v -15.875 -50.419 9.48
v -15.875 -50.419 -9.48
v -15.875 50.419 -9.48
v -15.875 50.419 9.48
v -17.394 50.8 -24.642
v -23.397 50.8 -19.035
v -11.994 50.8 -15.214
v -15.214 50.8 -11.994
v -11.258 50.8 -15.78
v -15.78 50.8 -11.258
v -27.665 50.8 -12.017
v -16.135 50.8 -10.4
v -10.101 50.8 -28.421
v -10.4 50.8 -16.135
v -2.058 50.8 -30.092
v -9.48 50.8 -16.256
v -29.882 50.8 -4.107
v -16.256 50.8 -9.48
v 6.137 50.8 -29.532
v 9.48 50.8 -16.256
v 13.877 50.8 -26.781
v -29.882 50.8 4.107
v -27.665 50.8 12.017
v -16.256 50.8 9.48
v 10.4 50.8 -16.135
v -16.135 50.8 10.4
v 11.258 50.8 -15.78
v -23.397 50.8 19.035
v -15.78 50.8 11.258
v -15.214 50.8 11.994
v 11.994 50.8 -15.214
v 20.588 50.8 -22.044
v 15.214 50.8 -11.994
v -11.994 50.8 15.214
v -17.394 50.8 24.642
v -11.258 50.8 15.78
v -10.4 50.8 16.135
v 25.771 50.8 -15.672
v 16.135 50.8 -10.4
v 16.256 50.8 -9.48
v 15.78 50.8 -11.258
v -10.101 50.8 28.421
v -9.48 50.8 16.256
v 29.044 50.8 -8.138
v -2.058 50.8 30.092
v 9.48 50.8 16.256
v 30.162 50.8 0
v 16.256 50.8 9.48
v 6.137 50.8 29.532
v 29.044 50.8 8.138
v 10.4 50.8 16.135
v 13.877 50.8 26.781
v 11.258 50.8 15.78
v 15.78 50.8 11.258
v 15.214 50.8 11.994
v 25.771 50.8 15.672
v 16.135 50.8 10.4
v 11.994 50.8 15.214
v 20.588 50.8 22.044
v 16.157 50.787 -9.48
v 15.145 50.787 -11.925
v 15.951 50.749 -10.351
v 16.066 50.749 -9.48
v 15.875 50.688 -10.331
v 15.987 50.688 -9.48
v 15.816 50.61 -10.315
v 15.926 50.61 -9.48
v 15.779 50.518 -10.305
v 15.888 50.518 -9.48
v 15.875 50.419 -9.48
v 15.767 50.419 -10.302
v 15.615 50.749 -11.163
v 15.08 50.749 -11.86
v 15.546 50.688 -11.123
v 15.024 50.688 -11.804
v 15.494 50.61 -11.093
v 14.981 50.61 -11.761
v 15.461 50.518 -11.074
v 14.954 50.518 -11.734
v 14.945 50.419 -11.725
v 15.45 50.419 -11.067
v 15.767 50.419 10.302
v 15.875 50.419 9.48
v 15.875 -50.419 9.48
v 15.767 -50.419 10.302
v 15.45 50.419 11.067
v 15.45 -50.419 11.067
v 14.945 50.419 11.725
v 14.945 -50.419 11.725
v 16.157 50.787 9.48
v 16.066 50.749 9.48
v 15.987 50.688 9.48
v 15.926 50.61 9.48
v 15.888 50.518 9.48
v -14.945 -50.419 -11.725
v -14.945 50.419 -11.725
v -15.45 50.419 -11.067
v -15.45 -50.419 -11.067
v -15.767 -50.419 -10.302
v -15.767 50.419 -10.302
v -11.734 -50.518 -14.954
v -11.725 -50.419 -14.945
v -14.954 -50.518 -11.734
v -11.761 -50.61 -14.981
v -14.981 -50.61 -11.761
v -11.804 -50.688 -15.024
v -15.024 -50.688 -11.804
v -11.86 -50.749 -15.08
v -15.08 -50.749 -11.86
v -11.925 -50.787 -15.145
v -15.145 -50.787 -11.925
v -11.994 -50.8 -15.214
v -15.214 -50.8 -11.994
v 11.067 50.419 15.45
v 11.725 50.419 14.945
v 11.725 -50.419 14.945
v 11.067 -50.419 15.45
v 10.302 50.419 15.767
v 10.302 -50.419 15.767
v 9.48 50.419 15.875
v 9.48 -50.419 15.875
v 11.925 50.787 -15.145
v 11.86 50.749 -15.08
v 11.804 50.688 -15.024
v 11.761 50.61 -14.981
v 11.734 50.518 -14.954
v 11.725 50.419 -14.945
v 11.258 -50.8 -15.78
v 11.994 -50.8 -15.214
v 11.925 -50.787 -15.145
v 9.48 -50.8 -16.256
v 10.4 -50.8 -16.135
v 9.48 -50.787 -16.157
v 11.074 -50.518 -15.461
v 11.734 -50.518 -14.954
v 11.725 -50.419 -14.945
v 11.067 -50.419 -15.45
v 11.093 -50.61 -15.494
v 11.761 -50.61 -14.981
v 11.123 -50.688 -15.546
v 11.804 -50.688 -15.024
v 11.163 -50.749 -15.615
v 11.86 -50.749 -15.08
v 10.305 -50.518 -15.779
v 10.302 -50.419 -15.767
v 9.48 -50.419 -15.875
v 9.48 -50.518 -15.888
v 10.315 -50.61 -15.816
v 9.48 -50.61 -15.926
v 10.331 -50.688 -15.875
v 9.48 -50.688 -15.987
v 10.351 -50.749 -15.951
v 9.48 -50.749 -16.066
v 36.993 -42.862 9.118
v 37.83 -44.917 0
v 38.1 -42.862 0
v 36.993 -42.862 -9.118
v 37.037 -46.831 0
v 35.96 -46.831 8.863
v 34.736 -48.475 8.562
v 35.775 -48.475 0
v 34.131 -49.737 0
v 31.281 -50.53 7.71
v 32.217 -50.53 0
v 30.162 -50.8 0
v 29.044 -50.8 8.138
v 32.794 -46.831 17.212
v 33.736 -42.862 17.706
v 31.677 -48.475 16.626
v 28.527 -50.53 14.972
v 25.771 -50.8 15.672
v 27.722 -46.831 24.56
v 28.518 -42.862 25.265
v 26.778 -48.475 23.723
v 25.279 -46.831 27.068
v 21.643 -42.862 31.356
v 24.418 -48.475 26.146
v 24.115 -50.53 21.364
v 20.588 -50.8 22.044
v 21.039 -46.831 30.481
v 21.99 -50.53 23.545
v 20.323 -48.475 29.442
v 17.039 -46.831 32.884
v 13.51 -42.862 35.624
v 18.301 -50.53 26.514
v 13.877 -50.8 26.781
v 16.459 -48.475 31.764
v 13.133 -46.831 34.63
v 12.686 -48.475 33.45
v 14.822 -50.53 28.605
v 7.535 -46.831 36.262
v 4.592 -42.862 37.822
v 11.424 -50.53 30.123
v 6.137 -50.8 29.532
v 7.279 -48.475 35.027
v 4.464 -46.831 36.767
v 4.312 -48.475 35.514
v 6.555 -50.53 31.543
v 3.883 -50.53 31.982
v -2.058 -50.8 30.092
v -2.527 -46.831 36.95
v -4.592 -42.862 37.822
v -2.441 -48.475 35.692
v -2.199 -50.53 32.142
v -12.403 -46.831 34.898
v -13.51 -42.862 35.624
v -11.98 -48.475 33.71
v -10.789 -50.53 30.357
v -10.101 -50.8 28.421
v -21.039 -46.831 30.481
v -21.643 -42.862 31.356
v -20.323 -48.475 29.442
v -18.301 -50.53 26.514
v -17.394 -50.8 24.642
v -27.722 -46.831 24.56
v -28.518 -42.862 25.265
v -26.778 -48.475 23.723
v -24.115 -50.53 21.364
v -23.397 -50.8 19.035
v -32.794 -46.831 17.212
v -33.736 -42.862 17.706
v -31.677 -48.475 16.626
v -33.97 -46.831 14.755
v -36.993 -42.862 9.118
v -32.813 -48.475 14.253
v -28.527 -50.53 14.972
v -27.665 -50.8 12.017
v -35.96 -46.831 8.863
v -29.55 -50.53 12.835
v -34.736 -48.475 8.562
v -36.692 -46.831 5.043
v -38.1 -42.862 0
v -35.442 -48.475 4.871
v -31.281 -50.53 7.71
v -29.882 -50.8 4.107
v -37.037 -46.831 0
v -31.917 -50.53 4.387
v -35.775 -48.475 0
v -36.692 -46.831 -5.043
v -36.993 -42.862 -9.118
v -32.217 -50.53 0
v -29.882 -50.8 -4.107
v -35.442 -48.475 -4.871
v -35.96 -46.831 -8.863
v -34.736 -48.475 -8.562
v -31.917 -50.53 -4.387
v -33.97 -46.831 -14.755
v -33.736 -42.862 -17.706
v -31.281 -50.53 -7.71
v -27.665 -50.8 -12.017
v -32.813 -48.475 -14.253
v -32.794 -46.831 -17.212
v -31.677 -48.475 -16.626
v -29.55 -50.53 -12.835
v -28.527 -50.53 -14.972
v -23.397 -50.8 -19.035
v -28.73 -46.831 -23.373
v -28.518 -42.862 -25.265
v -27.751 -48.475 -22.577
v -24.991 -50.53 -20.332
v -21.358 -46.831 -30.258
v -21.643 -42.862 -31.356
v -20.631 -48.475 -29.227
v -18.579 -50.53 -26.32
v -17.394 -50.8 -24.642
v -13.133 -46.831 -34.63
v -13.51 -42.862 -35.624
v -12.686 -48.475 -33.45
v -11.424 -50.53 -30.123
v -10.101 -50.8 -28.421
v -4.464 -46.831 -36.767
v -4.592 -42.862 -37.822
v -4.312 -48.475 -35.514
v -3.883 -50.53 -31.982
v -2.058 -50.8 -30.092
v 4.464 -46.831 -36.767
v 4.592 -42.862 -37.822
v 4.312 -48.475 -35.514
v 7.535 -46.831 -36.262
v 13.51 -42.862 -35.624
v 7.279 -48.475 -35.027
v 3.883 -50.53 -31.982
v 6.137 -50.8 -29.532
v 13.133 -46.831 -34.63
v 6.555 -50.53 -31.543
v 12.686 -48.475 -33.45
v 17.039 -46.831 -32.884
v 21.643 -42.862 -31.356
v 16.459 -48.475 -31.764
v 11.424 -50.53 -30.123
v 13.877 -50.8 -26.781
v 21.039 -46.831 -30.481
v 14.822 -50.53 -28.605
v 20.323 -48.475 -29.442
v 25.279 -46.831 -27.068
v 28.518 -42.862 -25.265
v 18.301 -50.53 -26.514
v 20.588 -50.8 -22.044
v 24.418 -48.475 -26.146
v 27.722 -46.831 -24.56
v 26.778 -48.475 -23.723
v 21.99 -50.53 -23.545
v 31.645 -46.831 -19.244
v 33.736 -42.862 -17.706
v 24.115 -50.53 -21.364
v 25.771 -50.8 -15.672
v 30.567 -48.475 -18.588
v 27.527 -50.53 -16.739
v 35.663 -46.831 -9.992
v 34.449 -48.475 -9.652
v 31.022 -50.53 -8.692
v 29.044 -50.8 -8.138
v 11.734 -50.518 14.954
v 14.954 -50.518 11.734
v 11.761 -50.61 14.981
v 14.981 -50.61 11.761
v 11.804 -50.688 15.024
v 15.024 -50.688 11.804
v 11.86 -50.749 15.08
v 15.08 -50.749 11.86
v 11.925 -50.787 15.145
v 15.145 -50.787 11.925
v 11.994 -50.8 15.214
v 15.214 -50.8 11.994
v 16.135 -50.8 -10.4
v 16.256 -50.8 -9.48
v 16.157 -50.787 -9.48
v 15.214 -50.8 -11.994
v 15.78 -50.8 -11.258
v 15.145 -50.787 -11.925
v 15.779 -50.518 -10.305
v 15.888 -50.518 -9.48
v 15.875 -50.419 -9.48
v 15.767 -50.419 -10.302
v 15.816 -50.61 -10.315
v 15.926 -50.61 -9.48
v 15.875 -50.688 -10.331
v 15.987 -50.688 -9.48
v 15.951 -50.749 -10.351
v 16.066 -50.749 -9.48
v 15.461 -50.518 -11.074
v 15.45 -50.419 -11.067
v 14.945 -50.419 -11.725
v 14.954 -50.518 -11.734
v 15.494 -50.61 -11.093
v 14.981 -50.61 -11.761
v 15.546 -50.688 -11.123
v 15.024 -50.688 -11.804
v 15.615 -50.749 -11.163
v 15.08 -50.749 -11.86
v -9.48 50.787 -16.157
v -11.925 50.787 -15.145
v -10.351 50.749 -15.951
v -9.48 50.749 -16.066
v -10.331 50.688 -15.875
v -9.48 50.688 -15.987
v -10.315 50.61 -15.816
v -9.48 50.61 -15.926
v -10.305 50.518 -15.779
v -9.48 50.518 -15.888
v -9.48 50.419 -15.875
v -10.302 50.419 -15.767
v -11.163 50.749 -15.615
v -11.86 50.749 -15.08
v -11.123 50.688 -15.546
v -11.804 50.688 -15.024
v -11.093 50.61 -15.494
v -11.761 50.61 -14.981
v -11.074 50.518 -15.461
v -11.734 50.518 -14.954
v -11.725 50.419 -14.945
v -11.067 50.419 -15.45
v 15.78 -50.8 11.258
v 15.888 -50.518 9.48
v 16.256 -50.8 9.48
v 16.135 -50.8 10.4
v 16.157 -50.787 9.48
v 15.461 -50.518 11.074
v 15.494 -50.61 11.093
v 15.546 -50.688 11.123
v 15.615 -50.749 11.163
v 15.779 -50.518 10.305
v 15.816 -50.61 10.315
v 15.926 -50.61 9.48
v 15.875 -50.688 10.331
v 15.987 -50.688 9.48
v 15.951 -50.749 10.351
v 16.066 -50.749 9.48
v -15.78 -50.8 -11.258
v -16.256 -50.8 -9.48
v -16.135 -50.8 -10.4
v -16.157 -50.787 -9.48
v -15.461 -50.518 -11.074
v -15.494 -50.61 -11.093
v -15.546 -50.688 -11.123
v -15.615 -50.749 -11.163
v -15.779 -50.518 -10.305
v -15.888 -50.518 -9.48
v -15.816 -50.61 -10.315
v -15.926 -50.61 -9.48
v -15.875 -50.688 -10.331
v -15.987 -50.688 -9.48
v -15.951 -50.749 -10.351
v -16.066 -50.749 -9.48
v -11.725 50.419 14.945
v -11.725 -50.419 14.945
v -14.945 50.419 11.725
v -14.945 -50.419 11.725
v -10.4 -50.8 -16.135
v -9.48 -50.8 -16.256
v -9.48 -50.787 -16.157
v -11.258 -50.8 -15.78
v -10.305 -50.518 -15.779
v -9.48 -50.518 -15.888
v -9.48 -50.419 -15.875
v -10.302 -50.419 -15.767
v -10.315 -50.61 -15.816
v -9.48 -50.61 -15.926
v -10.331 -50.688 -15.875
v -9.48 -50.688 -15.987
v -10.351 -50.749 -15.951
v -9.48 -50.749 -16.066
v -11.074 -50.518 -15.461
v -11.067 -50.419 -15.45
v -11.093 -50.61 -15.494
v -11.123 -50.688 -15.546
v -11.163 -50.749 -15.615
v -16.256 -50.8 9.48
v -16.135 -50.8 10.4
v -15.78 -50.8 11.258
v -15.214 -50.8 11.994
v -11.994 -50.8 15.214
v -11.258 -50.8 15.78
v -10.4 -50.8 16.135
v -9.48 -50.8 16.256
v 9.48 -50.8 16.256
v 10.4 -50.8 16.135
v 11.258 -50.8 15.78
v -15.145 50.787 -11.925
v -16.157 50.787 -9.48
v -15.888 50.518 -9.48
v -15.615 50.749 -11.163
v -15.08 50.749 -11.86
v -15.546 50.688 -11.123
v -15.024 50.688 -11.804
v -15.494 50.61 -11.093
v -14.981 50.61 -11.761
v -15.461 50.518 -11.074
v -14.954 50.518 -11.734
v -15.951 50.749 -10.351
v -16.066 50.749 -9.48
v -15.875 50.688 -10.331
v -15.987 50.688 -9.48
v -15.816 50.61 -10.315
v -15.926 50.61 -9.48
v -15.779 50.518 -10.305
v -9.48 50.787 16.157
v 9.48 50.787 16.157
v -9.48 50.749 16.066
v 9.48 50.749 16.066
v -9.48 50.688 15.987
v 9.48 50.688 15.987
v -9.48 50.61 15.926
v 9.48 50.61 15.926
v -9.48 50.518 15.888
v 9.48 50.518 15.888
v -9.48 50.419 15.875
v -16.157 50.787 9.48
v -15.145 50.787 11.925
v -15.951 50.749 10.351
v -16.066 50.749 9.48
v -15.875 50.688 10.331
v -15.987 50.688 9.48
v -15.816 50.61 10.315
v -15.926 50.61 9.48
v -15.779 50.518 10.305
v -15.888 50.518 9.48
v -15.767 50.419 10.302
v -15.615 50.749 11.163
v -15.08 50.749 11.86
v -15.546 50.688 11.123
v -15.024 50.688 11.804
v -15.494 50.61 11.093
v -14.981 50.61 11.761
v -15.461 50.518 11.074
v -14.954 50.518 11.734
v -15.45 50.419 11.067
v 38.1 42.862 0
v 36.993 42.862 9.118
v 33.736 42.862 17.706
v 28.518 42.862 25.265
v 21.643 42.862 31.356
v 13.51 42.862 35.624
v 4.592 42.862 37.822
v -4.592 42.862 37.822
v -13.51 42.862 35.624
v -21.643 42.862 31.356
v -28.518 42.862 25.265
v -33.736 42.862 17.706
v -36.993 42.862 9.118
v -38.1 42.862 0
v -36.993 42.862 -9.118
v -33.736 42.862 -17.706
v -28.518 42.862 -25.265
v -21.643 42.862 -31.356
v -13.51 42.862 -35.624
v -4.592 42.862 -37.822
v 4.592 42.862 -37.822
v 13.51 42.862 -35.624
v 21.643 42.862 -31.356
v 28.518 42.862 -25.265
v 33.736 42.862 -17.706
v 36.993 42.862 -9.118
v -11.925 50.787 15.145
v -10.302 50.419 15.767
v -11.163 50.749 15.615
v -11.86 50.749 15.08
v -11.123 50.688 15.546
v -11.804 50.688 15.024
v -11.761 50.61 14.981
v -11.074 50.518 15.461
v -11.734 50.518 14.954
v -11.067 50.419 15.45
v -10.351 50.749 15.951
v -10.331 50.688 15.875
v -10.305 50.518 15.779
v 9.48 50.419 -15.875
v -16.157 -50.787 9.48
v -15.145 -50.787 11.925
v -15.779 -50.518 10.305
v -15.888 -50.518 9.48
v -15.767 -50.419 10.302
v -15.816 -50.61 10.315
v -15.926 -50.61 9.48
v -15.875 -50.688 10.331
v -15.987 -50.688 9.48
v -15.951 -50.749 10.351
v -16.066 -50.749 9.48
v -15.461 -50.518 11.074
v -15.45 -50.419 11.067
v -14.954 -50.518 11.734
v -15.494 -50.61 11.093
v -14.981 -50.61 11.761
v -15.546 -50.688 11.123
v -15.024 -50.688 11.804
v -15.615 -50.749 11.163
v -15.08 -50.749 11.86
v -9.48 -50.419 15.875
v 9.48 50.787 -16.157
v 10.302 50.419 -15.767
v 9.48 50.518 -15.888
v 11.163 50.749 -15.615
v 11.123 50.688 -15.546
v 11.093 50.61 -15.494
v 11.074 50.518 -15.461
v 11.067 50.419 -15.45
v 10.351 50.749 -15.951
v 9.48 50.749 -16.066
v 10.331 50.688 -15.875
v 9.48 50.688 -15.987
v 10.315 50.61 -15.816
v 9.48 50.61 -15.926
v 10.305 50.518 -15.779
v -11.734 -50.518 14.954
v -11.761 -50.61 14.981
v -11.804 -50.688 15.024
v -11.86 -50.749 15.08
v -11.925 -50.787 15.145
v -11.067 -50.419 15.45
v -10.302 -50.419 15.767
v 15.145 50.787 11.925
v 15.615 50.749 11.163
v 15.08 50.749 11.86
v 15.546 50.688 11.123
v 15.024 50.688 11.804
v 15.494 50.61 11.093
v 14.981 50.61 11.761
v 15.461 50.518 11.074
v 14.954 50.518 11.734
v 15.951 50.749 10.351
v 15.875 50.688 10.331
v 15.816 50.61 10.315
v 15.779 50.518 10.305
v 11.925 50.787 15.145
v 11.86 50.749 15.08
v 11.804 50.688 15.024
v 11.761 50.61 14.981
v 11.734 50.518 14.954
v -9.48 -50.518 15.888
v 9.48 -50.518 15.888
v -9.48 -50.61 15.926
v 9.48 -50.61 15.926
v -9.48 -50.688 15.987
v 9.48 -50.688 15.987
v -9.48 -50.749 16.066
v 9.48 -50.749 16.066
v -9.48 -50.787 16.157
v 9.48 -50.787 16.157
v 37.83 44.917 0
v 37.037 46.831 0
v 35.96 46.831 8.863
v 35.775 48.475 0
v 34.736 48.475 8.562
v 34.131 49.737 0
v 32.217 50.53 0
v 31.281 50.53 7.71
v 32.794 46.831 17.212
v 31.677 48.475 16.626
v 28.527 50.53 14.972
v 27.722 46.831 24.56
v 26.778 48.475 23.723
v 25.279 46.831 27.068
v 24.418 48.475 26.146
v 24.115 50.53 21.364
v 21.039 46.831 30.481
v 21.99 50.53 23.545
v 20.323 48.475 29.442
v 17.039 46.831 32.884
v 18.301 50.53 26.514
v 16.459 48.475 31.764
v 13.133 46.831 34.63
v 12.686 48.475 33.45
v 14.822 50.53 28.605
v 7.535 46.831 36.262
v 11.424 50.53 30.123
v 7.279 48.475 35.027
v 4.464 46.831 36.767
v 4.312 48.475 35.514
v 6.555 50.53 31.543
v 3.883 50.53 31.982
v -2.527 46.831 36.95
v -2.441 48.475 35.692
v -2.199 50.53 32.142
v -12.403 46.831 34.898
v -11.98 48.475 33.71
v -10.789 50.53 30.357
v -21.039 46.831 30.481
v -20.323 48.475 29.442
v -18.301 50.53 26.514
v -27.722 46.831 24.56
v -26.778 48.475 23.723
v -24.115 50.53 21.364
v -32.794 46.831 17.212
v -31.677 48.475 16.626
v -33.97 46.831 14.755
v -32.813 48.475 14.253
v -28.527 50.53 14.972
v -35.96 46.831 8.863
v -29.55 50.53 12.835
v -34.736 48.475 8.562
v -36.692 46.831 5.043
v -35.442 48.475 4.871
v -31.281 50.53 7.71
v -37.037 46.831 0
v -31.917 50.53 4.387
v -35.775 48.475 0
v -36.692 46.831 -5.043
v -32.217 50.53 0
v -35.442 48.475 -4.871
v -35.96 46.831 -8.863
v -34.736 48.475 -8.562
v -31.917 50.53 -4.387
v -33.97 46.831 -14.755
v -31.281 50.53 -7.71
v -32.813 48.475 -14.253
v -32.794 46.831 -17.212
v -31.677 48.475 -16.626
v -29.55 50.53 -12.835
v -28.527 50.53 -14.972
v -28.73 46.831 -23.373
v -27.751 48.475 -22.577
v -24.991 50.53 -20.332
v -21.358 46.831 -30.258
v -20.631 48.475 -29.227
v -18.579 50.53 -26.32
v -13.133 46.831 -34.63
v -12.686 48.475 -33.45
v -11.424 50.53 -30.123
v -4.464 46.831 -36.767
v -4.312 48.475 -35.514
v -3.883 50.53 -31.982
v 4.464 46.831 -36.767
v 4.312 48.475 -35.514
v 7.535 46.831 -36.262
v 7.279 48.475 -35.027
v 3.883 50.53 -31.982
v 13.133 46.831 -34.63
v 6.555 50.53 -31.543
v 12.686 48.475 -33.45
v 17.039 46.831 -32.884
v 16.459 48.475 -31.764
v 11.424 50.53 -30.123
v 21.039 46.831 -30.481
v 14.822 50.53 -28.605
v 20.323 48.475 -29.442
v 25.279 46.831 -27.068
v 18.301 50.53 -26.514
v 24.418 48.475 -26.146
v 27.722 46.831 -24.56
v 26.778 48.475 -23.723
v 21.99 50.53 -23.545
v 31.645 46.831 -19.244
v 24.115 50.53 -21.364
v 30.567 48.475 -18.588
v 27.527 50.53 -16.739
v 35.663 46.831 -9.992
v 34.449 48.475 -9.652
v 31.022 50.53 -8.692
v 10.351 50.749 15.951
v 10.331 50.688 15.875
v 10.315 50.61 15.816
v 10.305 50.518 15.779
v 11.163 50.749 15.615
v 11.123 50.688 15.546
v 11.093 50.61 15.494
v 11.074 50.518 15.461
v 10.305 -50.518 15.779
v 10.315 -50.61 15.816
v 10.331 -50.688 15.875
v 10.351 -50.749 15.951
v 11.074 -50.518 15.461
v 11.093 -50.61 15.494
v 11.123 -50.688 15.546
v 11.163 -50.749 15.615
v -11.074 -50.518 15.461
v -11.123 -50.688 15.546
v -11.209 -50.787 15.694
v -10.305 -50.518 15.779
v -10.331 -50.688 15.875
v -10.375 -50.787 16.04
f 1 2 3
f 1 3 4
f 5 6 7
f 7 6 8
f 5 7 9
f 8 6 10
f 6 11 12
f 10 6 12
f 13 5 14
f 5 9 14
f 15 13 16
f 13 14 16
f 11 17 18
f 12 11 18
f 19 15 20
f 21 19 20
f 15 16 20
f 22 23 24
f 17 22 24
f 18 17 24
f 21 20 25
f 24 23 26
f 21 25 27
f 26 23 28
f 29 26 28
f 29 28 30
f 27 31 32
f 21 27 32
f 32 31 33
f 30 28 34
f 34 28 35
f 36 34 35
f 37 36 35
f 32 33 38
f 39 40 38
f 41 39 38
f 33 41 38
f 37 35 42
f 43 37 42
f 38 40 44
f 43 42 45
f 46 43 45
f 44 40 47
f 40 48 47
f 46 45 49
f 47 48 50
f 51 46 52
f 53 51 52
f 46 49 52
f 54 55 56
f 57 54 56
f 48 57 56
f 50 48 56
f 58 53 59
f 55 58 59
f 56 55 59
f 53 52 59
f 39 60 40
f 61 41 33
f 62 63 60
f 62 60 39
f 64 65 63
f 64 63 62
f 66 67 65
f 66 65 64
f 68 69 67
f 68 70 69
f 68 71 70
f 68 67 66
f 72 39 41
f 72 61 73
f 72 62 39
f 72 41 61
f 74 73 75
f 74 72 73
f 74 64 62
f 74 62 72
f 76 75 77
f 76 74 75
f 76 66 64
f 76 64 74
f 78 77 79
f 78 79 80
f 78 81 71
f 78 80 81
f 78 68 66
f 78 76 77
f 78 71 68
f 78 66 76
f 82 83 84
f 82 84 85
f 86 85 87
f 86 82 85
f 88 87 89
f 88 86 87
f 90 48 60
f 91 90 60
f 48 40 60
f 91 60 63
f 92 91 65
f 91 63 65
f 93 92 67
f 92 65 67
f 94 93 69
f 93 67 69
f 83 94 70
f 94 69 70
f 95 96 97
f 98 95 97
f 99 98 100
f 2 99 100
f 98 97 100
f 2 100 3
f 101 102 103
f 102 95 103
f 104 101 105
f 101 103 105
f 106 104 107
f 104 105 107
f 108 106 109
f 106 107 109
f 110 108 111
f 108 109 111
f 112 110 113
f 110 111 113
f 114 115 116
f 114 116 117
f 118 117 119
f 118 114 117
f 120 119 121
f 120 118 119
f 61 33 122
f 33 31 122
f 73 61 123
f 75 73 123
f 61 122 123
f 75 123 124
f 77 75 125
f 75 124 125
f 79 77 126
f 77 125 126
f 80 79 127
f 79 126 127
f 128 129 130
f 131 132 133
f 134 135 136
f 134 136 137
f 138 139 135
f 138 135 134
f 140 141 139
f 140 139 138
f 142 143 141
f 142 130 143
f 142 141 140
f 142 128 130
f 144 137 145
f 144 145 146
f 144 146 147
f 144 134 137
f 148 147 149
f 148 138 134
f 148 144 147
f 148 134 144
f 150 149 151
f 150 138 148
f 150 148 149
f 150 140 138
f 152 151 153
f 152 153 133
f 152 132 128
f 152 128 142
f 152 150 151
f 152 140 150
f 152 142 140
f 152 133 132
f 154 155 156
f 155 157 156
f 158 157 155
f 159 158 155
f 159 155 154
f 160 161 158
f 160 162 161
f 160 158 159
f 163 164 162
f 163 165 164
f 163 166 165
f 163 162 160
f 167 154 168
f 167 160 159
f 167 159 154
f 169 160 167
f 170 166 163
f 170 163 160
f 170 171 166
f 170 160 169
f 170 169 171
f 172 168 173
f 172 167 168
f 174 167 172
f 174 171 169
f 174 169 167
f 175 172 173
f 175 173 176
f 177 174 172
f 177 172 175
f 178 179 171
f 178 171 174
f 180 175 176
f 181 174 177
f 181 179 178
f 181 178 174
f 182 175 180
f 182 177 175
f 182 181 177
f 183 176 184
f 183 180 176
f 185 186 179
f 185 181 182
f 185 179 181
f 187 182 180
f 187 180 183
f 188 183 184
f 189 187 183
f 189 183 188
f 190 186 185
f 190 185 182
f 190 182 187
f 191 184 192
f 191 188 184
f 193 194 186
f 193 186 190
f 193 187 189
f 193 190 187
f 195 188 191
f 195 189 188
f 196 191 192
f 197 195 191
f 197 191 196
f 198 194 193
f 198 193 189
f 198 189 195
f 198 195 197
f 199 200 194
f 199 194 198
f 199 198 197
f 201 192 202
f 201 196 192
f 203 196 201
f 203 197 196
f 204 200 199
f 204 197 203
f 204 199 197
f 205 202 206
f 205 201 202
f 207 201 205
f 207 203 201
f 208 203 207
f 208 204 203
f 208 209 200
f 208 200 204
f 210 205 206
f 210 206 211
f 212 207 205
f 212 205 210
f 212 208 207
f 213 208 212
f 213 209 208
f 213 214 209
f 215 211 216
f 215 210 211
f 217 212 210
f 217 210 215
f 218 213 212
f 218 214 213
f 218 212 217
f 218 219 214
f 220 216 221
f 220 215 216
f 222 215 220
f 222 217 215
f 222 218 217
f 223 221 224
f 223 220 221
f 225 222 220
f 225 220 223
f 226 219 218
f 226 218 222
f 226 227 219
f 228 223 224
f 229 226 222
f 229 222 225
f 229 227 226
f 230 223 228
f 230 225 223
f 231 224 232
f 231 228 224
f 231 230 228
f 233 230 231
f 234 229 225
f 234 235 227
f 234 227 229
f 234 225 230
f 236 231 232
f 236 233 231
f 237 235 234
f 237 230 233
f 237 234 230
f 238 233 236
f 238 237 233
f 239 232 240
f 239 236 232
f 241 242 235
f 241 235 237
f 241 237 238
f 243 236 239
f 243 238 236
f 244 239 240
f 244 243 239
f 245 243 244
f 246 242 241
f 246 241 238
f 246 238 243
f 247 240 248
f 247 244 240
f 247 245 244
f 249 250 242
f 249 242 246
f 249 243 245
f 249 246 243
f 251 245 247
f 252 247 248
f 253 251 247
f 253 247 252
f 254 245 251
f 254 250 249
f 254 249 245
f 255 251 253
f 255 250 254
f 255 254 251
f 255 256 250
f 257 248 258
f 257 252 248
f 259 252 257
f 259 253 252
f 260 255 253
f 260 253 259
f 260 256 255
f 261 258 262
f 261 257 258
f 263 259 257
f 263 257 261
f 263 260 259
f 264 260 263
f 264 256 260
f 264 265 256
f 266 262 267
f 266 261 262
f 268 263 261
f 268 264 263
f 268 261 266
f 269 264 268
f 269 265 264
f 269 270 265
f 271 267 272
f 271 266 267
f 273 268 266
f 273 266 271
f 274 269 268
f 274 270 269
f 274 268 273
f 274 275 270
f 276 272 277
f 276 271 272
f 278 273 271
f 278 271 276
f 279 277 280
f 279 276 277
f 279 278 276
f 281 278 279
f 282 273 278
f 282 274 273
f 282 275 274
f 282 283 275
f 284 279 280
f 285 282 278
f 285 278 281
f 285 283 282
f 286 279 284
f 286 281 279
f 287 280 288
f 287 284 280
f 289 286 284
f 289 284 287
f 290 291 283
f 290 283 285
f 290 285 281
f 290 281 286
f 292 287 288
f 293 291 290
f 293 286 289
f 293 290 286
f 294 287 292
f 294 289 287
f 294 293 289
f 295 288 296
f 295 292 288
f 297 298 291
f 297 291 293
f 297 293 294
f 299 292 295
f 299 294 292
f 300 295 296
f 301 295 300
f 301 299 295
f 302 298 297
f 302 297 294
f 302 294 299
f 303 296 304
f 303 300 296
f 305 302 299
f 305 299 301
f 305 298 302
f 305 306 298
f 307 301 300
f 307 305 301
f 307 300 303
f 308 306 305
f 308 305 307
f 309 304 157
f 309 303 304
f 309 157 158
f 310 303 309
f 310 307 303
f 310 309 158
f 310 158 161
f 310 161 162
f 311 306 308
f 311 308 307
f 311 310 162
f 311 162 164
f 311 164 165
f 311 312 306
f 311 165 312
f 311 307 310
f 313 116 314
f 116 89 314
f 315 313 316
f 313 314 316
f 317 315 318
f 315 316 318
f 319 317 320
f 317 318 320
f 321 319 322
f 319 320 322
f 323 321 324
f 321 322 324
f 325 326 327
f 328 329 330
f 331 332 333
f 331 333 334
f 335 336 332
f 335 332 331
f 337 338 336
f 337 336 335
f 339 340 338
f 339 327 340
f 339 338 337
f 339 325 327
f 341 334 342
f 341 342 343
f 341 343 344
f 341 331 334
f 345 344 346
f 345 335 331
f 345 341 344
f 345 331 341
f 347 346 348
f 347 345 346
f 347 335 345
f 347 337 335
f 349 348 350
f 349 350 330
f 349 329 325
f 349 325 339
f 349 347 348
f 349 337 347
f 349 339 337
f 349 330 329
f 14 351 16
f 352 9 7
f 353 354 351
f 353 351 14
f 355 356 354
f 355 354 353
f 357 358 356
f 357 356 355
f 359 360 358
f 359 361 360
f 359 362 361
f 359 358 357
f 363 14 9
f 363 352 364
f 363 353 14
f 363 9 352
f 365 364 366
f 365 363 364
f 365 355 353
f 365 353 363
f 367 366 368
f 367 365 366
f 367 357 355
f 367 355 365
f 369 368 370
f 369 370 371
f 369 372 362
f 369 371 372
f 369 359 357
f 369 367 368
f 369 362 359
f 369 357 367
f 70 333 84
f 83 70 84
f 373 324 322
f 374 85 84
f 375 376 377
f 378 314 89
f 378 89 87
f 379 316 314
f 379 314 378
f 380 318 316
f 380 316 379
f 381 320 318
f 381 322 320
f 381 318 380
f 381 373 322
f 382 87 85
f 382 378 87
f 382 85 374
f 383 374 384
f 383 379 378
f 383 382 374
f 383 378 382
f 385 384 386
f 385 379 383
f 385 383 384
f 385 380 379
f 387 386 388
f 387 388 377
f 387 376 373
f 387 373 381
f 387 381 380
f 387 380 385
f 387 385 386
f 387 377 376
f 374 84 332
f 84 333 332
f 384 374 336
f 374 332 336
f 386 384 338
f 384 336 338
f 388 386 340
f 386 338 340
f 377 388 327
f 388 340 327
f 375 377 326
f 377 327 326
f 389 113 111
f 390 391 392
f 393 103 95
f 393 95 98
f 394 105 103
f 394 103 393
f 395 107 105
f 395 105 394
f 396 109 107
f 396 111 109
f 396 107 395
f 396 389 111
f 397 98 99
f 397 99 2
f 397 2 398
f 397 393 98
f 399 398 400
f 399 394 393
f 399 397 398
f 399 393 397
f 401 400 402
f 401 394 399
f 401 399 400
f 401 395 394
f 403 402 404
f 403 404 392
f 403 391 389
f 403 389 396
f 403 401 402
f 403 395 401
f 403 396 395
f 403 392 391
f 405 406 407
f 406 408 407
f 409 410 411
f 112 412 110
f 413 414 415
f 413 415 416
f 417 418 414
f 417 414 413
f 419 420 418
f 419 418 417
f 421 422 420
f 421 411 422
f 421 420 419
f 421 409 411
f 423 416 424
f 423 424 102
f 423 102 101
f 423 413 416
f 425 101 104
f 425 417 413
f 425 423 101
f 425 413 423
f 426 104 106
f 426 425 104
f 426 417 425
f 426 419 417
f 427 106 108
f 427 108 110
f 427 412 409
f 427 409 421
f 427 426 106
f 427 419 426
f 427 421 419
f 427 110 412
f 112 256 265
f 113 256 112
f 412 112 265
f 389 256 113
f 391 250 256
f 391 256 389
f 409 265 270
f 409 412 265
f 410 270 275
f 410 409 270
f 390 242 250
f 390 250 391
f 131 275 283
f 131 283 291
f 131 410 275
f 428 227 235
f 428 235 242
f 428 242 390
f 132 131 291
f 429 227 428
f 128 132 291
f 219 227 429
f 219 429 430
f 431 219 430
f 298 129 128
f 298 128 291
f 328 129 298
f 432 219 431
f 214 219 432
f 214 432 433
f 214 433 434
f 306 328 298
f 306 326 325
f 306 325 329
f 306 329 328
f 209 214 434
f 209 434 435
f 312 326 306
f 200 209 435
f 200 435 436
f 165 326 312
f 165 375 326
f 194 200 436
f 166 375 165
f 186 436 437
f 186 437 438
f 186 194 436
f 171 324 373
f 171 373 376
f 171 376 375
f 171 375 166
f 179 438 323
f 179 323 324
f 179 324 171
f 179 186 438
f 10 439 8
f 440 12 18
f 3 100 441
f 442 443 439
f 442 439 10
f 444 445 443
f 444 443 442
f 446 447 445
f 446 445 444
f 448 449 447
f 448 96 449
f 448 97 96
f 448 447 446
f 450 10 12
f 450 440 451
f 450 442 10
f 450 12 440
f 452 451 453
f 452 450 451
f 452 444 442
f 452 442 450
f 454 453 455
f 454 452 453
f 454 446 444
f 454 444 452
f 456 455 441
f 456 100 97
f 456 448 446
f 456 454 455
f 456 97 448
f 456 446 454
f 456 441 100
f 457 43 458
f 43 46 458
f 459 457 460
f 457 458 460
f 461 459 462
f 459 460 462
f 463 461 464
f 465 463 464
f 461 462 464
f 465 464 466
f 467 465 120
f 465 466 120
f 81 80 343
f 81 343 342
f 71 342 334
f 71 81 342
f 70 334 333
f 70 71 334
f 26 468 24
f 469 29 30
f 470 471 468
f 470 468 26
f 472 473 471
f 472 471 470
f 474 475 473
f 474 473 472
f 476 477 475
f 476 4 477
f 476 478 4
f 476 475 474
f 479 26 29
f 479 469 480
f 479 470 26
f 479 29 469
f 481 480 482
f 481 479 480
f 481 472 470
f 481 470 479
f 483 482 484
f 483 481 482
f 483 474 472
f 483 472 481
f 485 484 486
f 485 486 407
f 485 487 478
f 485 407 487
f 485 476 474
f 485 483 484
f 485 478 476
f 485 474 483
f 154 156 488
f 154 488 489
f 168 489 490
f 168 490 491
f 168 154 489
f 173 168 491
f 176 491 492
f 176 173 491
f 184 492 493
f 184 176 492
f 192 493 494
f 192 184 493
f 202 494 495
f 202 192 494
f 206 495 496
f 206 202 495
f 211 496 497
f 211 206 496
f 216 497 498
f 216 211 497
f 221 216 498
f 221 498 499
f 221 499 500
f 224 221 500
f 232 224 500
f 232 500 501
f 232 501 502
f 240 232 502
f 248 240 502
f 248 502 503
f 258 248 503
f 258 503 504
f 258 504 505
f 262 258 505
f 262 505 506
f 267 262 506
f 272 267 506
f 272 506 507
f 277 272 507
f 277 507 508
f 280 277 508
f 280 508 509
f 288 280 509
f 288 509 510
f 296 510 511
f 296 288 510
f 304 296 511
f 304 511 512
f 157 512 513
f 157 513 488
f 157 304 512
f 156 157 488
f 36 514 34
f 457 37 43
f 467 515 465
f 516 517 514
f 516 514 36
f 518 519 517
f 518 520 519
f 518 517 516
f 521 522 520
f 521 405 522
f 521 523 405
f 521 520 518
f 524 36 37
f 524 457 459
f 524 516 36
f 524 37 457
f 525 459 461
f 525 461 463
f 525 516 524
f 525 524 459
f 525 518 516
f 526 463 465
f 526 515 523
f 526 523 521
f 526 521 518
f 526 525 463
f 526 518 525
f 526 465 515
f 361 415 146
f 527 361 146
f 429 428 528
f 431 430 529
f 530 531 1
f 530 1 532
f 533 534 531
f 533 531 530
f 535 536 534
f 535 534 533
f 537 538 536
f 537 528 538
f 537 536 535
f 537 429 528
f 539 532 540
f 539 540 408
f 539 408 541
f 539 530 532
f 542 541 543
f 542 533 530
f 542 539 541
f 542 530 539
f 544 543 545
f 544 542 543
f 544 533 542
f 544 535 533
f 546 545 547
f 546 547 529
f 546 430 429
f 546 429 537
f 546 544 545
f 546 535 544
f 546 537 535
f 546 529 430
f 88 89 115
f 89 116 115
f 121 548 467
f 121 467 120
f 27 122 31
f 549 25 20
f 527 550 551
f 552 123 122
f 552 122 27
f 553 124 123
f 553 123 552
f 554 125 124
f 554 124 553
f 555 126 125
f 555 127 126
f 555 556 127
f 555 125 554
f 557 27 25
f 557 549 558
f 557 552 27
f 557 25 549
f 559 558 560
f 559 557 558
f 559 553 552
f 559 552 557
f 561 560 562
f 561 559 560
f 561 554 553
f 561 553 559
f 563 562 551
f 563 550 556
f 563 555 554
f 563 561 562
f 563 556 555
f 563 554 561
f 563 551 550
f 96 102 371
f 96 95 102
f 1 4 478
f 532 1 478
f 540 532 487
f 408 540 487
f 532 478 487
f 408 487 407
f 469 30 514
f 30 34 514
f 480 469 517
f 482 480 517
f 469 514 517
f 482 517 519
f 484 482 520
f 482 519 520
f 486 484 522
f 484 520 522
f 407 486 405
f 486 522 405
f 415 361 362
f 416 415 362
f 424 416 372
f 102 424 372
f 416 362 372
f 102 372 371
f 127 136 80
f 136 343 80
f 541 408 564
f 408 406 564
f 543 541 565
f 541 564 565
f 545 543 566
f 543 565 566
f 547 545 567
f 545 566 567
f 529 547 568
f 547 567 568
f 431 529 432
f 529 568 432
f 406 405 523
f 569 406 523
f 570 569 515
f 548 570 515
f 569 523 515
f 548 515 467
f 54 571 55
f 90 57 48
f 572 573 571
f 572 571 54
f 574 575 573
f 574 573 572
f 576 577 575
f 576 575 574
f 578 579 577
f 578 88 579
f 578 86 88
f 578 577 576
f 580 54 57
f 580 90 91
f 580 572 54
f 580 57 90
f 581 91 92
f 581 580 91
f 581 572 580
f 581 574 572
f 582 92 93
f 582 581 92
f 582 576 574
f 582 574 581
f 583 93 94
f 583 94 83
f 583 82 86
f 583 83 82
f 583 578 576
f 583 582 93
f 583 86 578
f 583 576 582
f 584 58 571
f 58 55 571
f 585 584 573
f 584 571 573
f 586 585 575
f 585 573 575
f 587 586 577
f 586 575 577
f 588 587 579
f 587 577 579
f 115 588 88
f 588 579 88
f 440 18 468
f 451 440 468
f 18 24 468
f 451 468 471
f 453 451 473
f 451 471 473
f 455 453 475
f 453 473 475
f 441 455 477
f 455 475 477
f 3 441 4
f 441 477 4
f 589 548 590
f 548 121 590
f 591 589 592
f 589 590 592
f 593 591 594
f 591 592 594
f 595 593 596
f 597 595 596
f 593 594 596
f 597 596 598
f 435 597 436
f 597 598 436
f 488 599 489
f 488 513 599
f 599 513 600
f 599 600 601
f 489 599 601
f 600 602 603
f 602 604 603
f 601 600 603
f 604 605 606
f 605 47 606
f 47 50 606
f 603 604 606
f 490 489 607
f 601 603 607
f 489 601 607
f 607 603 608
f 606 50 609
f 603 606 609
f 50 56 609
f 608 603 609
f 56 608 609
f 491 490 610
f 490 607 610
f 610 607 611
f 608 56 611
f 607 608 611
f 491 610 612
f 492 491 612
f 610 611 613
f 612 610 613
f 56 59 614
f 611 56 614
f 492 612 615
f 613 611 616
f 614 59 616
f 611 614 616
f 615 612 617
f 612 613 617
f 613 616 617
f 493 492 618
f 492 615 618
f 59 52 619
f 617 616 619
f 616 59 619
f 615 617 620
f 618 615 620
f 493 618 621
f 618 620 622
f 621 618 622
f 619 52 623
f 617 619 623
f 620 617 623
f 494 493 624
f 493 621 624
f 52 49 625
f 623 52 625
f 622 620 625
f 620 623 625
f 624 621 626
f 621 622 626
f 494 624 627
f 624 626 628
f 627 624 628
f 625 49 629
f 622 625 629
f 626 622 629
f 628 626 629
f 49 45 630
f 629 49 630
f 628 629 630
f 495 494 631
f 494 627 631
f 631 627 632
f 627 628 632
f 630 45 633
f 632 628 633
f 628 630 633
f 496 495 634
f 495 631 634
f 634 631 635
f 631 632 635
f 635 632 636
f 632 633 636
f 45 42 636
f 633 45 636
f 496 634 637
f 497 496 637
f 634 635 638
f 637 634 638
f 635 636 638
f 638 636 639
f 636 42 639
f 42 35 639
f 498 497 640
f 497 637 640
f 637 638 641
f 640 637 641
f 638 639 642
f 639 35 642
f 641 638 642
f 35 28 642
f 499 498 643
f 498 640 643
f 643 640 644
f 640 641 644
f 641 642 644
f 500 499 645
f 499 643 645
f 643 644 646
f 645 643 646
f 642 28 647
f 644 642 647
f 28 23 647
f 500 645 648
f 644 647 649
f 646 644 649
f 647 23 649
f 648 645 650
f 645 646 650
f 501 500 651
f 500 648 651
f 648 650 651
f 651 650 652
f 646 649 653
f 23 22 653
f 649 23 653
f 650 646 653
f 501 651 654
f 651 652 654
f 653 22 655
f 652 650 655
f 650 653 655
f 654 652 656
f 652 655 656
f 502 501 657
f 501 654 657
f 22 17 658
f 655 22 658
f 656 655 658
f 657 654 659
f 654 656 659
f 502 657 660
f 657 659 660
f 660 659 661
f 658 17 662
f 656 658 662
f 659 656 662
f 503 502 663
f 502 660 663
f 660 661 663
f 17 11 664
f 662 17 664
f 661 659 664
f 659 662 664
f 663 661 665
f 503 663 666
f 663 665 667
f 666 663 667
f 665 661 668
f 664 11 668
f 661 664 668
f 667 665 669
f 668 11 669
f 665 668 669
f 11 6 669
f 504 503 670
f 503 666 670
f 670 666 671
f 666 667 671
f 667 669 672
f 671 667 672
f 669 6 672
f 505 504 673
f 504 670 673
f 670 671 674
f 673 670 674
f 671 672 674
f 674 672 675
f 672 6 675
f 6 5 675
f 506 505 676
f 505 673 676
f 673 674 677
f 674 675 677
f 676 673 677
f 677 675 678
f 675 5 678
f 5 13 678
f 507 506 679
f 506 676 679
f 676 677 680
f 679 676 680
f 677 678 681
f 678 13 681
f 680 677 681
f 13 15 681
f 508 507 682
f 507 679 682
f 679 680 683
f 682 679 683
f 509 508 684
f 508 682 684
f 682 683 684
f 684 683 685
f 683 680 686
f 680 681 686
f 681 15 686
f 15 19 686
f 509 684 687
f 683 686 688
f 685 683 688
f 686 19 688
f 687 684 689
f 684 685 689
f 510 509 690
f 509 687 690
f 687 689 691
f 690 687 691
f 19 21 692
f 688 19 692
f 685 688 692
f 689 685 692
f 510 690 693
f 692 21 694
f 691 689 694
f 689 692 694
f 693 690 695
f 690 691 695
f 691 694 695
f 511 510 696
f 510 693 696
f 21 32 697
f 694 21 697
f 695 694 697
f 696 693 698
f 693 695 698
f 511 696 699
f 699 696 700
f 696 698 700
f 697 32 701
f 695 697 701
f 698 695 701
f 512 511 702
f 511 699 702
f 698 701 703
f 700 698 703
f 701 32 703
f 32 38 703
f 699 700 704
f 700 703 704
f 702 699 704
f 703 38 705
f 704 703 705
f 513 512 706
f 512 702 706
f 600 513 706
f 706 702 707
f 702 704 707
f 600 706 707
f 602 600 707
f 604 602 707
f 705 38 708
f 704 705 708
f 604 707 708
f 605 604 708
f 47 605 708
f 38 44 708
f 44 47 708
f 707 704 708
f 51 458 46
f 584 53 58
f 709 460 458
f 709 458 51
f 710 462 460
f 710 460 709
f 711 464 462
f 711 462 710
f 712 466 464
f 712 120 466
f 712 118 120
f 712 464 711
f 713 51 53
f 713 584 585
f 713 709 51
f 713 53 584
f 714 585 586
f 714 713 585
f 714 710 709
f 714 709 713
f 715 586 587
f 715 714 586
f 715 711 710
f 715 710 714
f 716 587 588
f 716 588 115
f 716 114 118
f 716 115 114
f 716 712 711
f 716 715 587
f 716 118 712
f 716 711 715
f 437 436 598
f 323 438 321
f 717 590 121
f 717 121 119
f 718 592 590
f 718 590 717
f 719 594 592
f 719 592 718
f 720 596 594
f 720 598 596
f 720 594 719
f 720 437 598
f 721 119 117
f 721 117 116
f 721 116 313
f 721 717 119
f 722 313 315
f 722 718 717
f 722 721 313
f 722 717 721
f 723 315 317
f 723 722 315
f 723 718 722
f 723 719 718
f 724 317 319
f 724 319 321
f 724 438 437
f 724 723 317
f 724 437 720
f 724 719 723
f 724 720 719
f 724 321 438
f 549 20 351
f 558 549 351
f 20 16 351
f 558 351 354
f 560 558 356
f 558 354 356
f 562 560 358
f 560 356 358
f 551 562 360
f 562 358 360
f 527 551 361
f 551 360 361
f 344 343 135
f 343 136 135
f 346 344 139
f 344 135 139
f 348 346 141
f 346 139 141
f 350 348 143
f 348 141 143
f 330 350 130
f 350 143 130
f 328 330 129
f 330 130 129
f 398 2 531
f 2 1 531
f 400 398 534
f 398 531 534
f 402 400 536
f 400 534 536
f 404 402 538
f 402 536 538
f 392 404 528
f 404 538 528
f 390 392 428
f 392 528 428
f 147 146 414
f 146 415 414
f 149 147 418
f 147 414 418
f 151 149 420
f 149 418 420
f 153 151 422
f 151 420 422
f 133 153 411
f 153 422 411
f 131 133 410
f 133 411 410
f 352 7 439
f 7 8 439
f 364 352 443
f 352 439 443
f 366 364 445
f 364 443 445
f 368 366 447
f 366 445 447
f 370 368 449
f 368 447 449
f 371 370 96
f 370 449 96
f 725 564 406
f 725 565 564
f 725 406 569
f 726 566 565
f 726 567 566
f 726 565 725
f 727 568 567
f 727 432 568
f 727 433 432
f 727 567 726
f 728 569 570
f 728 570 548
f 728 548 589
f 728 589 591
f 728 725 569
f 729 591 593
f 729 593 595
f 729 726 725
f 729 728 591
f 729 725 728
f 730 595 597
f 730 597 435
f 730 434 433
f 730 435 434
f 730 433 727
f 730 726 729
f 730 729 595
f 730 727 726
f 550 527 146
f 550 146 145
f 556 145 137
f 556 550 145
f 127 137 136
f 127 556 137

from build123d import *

# Parameters (mm, degrees)
F0_R     = 38.1
F1_DEPTH = 50.8
F2_R     = 7.9375
F3_W     = 31.75
F3_H     = 31.75
F4_DEPTH = 101.601
F5_SIZE  = 5.08
F6_R     = 3.175
F7_R     = 0.381


with BuildPart() as f1:
    # F0 (on Front) → F1 (new body, symmetric)
    with BuildSketch(Plane.XZ):
        Circle(F0_R)
    extrude(amount=F1_DEPTH, both=True)

    # F2
    f2_edges = [f1.edges().sort_by_distance(p)[0] for p in [
        (-38.1, -50.8, 0),
        (-38.1, 50.8, 0),
    ]]
    fillet(f2_edges, radius=F2_R)

    # F3 (on face) → F4 (cut, through all)
    with BuildSketch(Plane.XZ.offset(50.8)):
        Rectangle(F3_W, F3_H)
    extrude(amount=-F4_DEPTH, mode=Mode.SUBTRACT)

    # F5
    f5_edges = [f1.edges().sort_by_distance(p)[0] for p in [
        (-15.875, 0, 15.875),
        (15.875, 0, -15.875),
        (15.875, 0, 15.875),
        (-15.875, 0, -15.875),
    ]]
    chamfer(f5_edges, length=F5_SIZE)

    # F6
    f6_edges = [f1.edges().sort_by_distance(p)[0] for p in [
        (-10.795, 0, -15.875),
        (-15.875, 0, -10.795),
        (-15.875, 0, 10.795),
        (-10.795, 0, 15.875),
        (10.795, 0, 15.875),
        (15.875, 0, 10.795),
        (15.875, 0, -10.795),
        (10.795, 0, -15.875),
    ]]
    fillet(f6_edges, radius=F6_R)

    # F7
    f7_edges = [f1.edges().sort_by_distance(p)[0] for p in [
        (0, -50.8, 15.875),
        (0, 50.8, 15.875),
    ]]
    fillet(f7_edges, radius=F7_R)


solid = f1.part
